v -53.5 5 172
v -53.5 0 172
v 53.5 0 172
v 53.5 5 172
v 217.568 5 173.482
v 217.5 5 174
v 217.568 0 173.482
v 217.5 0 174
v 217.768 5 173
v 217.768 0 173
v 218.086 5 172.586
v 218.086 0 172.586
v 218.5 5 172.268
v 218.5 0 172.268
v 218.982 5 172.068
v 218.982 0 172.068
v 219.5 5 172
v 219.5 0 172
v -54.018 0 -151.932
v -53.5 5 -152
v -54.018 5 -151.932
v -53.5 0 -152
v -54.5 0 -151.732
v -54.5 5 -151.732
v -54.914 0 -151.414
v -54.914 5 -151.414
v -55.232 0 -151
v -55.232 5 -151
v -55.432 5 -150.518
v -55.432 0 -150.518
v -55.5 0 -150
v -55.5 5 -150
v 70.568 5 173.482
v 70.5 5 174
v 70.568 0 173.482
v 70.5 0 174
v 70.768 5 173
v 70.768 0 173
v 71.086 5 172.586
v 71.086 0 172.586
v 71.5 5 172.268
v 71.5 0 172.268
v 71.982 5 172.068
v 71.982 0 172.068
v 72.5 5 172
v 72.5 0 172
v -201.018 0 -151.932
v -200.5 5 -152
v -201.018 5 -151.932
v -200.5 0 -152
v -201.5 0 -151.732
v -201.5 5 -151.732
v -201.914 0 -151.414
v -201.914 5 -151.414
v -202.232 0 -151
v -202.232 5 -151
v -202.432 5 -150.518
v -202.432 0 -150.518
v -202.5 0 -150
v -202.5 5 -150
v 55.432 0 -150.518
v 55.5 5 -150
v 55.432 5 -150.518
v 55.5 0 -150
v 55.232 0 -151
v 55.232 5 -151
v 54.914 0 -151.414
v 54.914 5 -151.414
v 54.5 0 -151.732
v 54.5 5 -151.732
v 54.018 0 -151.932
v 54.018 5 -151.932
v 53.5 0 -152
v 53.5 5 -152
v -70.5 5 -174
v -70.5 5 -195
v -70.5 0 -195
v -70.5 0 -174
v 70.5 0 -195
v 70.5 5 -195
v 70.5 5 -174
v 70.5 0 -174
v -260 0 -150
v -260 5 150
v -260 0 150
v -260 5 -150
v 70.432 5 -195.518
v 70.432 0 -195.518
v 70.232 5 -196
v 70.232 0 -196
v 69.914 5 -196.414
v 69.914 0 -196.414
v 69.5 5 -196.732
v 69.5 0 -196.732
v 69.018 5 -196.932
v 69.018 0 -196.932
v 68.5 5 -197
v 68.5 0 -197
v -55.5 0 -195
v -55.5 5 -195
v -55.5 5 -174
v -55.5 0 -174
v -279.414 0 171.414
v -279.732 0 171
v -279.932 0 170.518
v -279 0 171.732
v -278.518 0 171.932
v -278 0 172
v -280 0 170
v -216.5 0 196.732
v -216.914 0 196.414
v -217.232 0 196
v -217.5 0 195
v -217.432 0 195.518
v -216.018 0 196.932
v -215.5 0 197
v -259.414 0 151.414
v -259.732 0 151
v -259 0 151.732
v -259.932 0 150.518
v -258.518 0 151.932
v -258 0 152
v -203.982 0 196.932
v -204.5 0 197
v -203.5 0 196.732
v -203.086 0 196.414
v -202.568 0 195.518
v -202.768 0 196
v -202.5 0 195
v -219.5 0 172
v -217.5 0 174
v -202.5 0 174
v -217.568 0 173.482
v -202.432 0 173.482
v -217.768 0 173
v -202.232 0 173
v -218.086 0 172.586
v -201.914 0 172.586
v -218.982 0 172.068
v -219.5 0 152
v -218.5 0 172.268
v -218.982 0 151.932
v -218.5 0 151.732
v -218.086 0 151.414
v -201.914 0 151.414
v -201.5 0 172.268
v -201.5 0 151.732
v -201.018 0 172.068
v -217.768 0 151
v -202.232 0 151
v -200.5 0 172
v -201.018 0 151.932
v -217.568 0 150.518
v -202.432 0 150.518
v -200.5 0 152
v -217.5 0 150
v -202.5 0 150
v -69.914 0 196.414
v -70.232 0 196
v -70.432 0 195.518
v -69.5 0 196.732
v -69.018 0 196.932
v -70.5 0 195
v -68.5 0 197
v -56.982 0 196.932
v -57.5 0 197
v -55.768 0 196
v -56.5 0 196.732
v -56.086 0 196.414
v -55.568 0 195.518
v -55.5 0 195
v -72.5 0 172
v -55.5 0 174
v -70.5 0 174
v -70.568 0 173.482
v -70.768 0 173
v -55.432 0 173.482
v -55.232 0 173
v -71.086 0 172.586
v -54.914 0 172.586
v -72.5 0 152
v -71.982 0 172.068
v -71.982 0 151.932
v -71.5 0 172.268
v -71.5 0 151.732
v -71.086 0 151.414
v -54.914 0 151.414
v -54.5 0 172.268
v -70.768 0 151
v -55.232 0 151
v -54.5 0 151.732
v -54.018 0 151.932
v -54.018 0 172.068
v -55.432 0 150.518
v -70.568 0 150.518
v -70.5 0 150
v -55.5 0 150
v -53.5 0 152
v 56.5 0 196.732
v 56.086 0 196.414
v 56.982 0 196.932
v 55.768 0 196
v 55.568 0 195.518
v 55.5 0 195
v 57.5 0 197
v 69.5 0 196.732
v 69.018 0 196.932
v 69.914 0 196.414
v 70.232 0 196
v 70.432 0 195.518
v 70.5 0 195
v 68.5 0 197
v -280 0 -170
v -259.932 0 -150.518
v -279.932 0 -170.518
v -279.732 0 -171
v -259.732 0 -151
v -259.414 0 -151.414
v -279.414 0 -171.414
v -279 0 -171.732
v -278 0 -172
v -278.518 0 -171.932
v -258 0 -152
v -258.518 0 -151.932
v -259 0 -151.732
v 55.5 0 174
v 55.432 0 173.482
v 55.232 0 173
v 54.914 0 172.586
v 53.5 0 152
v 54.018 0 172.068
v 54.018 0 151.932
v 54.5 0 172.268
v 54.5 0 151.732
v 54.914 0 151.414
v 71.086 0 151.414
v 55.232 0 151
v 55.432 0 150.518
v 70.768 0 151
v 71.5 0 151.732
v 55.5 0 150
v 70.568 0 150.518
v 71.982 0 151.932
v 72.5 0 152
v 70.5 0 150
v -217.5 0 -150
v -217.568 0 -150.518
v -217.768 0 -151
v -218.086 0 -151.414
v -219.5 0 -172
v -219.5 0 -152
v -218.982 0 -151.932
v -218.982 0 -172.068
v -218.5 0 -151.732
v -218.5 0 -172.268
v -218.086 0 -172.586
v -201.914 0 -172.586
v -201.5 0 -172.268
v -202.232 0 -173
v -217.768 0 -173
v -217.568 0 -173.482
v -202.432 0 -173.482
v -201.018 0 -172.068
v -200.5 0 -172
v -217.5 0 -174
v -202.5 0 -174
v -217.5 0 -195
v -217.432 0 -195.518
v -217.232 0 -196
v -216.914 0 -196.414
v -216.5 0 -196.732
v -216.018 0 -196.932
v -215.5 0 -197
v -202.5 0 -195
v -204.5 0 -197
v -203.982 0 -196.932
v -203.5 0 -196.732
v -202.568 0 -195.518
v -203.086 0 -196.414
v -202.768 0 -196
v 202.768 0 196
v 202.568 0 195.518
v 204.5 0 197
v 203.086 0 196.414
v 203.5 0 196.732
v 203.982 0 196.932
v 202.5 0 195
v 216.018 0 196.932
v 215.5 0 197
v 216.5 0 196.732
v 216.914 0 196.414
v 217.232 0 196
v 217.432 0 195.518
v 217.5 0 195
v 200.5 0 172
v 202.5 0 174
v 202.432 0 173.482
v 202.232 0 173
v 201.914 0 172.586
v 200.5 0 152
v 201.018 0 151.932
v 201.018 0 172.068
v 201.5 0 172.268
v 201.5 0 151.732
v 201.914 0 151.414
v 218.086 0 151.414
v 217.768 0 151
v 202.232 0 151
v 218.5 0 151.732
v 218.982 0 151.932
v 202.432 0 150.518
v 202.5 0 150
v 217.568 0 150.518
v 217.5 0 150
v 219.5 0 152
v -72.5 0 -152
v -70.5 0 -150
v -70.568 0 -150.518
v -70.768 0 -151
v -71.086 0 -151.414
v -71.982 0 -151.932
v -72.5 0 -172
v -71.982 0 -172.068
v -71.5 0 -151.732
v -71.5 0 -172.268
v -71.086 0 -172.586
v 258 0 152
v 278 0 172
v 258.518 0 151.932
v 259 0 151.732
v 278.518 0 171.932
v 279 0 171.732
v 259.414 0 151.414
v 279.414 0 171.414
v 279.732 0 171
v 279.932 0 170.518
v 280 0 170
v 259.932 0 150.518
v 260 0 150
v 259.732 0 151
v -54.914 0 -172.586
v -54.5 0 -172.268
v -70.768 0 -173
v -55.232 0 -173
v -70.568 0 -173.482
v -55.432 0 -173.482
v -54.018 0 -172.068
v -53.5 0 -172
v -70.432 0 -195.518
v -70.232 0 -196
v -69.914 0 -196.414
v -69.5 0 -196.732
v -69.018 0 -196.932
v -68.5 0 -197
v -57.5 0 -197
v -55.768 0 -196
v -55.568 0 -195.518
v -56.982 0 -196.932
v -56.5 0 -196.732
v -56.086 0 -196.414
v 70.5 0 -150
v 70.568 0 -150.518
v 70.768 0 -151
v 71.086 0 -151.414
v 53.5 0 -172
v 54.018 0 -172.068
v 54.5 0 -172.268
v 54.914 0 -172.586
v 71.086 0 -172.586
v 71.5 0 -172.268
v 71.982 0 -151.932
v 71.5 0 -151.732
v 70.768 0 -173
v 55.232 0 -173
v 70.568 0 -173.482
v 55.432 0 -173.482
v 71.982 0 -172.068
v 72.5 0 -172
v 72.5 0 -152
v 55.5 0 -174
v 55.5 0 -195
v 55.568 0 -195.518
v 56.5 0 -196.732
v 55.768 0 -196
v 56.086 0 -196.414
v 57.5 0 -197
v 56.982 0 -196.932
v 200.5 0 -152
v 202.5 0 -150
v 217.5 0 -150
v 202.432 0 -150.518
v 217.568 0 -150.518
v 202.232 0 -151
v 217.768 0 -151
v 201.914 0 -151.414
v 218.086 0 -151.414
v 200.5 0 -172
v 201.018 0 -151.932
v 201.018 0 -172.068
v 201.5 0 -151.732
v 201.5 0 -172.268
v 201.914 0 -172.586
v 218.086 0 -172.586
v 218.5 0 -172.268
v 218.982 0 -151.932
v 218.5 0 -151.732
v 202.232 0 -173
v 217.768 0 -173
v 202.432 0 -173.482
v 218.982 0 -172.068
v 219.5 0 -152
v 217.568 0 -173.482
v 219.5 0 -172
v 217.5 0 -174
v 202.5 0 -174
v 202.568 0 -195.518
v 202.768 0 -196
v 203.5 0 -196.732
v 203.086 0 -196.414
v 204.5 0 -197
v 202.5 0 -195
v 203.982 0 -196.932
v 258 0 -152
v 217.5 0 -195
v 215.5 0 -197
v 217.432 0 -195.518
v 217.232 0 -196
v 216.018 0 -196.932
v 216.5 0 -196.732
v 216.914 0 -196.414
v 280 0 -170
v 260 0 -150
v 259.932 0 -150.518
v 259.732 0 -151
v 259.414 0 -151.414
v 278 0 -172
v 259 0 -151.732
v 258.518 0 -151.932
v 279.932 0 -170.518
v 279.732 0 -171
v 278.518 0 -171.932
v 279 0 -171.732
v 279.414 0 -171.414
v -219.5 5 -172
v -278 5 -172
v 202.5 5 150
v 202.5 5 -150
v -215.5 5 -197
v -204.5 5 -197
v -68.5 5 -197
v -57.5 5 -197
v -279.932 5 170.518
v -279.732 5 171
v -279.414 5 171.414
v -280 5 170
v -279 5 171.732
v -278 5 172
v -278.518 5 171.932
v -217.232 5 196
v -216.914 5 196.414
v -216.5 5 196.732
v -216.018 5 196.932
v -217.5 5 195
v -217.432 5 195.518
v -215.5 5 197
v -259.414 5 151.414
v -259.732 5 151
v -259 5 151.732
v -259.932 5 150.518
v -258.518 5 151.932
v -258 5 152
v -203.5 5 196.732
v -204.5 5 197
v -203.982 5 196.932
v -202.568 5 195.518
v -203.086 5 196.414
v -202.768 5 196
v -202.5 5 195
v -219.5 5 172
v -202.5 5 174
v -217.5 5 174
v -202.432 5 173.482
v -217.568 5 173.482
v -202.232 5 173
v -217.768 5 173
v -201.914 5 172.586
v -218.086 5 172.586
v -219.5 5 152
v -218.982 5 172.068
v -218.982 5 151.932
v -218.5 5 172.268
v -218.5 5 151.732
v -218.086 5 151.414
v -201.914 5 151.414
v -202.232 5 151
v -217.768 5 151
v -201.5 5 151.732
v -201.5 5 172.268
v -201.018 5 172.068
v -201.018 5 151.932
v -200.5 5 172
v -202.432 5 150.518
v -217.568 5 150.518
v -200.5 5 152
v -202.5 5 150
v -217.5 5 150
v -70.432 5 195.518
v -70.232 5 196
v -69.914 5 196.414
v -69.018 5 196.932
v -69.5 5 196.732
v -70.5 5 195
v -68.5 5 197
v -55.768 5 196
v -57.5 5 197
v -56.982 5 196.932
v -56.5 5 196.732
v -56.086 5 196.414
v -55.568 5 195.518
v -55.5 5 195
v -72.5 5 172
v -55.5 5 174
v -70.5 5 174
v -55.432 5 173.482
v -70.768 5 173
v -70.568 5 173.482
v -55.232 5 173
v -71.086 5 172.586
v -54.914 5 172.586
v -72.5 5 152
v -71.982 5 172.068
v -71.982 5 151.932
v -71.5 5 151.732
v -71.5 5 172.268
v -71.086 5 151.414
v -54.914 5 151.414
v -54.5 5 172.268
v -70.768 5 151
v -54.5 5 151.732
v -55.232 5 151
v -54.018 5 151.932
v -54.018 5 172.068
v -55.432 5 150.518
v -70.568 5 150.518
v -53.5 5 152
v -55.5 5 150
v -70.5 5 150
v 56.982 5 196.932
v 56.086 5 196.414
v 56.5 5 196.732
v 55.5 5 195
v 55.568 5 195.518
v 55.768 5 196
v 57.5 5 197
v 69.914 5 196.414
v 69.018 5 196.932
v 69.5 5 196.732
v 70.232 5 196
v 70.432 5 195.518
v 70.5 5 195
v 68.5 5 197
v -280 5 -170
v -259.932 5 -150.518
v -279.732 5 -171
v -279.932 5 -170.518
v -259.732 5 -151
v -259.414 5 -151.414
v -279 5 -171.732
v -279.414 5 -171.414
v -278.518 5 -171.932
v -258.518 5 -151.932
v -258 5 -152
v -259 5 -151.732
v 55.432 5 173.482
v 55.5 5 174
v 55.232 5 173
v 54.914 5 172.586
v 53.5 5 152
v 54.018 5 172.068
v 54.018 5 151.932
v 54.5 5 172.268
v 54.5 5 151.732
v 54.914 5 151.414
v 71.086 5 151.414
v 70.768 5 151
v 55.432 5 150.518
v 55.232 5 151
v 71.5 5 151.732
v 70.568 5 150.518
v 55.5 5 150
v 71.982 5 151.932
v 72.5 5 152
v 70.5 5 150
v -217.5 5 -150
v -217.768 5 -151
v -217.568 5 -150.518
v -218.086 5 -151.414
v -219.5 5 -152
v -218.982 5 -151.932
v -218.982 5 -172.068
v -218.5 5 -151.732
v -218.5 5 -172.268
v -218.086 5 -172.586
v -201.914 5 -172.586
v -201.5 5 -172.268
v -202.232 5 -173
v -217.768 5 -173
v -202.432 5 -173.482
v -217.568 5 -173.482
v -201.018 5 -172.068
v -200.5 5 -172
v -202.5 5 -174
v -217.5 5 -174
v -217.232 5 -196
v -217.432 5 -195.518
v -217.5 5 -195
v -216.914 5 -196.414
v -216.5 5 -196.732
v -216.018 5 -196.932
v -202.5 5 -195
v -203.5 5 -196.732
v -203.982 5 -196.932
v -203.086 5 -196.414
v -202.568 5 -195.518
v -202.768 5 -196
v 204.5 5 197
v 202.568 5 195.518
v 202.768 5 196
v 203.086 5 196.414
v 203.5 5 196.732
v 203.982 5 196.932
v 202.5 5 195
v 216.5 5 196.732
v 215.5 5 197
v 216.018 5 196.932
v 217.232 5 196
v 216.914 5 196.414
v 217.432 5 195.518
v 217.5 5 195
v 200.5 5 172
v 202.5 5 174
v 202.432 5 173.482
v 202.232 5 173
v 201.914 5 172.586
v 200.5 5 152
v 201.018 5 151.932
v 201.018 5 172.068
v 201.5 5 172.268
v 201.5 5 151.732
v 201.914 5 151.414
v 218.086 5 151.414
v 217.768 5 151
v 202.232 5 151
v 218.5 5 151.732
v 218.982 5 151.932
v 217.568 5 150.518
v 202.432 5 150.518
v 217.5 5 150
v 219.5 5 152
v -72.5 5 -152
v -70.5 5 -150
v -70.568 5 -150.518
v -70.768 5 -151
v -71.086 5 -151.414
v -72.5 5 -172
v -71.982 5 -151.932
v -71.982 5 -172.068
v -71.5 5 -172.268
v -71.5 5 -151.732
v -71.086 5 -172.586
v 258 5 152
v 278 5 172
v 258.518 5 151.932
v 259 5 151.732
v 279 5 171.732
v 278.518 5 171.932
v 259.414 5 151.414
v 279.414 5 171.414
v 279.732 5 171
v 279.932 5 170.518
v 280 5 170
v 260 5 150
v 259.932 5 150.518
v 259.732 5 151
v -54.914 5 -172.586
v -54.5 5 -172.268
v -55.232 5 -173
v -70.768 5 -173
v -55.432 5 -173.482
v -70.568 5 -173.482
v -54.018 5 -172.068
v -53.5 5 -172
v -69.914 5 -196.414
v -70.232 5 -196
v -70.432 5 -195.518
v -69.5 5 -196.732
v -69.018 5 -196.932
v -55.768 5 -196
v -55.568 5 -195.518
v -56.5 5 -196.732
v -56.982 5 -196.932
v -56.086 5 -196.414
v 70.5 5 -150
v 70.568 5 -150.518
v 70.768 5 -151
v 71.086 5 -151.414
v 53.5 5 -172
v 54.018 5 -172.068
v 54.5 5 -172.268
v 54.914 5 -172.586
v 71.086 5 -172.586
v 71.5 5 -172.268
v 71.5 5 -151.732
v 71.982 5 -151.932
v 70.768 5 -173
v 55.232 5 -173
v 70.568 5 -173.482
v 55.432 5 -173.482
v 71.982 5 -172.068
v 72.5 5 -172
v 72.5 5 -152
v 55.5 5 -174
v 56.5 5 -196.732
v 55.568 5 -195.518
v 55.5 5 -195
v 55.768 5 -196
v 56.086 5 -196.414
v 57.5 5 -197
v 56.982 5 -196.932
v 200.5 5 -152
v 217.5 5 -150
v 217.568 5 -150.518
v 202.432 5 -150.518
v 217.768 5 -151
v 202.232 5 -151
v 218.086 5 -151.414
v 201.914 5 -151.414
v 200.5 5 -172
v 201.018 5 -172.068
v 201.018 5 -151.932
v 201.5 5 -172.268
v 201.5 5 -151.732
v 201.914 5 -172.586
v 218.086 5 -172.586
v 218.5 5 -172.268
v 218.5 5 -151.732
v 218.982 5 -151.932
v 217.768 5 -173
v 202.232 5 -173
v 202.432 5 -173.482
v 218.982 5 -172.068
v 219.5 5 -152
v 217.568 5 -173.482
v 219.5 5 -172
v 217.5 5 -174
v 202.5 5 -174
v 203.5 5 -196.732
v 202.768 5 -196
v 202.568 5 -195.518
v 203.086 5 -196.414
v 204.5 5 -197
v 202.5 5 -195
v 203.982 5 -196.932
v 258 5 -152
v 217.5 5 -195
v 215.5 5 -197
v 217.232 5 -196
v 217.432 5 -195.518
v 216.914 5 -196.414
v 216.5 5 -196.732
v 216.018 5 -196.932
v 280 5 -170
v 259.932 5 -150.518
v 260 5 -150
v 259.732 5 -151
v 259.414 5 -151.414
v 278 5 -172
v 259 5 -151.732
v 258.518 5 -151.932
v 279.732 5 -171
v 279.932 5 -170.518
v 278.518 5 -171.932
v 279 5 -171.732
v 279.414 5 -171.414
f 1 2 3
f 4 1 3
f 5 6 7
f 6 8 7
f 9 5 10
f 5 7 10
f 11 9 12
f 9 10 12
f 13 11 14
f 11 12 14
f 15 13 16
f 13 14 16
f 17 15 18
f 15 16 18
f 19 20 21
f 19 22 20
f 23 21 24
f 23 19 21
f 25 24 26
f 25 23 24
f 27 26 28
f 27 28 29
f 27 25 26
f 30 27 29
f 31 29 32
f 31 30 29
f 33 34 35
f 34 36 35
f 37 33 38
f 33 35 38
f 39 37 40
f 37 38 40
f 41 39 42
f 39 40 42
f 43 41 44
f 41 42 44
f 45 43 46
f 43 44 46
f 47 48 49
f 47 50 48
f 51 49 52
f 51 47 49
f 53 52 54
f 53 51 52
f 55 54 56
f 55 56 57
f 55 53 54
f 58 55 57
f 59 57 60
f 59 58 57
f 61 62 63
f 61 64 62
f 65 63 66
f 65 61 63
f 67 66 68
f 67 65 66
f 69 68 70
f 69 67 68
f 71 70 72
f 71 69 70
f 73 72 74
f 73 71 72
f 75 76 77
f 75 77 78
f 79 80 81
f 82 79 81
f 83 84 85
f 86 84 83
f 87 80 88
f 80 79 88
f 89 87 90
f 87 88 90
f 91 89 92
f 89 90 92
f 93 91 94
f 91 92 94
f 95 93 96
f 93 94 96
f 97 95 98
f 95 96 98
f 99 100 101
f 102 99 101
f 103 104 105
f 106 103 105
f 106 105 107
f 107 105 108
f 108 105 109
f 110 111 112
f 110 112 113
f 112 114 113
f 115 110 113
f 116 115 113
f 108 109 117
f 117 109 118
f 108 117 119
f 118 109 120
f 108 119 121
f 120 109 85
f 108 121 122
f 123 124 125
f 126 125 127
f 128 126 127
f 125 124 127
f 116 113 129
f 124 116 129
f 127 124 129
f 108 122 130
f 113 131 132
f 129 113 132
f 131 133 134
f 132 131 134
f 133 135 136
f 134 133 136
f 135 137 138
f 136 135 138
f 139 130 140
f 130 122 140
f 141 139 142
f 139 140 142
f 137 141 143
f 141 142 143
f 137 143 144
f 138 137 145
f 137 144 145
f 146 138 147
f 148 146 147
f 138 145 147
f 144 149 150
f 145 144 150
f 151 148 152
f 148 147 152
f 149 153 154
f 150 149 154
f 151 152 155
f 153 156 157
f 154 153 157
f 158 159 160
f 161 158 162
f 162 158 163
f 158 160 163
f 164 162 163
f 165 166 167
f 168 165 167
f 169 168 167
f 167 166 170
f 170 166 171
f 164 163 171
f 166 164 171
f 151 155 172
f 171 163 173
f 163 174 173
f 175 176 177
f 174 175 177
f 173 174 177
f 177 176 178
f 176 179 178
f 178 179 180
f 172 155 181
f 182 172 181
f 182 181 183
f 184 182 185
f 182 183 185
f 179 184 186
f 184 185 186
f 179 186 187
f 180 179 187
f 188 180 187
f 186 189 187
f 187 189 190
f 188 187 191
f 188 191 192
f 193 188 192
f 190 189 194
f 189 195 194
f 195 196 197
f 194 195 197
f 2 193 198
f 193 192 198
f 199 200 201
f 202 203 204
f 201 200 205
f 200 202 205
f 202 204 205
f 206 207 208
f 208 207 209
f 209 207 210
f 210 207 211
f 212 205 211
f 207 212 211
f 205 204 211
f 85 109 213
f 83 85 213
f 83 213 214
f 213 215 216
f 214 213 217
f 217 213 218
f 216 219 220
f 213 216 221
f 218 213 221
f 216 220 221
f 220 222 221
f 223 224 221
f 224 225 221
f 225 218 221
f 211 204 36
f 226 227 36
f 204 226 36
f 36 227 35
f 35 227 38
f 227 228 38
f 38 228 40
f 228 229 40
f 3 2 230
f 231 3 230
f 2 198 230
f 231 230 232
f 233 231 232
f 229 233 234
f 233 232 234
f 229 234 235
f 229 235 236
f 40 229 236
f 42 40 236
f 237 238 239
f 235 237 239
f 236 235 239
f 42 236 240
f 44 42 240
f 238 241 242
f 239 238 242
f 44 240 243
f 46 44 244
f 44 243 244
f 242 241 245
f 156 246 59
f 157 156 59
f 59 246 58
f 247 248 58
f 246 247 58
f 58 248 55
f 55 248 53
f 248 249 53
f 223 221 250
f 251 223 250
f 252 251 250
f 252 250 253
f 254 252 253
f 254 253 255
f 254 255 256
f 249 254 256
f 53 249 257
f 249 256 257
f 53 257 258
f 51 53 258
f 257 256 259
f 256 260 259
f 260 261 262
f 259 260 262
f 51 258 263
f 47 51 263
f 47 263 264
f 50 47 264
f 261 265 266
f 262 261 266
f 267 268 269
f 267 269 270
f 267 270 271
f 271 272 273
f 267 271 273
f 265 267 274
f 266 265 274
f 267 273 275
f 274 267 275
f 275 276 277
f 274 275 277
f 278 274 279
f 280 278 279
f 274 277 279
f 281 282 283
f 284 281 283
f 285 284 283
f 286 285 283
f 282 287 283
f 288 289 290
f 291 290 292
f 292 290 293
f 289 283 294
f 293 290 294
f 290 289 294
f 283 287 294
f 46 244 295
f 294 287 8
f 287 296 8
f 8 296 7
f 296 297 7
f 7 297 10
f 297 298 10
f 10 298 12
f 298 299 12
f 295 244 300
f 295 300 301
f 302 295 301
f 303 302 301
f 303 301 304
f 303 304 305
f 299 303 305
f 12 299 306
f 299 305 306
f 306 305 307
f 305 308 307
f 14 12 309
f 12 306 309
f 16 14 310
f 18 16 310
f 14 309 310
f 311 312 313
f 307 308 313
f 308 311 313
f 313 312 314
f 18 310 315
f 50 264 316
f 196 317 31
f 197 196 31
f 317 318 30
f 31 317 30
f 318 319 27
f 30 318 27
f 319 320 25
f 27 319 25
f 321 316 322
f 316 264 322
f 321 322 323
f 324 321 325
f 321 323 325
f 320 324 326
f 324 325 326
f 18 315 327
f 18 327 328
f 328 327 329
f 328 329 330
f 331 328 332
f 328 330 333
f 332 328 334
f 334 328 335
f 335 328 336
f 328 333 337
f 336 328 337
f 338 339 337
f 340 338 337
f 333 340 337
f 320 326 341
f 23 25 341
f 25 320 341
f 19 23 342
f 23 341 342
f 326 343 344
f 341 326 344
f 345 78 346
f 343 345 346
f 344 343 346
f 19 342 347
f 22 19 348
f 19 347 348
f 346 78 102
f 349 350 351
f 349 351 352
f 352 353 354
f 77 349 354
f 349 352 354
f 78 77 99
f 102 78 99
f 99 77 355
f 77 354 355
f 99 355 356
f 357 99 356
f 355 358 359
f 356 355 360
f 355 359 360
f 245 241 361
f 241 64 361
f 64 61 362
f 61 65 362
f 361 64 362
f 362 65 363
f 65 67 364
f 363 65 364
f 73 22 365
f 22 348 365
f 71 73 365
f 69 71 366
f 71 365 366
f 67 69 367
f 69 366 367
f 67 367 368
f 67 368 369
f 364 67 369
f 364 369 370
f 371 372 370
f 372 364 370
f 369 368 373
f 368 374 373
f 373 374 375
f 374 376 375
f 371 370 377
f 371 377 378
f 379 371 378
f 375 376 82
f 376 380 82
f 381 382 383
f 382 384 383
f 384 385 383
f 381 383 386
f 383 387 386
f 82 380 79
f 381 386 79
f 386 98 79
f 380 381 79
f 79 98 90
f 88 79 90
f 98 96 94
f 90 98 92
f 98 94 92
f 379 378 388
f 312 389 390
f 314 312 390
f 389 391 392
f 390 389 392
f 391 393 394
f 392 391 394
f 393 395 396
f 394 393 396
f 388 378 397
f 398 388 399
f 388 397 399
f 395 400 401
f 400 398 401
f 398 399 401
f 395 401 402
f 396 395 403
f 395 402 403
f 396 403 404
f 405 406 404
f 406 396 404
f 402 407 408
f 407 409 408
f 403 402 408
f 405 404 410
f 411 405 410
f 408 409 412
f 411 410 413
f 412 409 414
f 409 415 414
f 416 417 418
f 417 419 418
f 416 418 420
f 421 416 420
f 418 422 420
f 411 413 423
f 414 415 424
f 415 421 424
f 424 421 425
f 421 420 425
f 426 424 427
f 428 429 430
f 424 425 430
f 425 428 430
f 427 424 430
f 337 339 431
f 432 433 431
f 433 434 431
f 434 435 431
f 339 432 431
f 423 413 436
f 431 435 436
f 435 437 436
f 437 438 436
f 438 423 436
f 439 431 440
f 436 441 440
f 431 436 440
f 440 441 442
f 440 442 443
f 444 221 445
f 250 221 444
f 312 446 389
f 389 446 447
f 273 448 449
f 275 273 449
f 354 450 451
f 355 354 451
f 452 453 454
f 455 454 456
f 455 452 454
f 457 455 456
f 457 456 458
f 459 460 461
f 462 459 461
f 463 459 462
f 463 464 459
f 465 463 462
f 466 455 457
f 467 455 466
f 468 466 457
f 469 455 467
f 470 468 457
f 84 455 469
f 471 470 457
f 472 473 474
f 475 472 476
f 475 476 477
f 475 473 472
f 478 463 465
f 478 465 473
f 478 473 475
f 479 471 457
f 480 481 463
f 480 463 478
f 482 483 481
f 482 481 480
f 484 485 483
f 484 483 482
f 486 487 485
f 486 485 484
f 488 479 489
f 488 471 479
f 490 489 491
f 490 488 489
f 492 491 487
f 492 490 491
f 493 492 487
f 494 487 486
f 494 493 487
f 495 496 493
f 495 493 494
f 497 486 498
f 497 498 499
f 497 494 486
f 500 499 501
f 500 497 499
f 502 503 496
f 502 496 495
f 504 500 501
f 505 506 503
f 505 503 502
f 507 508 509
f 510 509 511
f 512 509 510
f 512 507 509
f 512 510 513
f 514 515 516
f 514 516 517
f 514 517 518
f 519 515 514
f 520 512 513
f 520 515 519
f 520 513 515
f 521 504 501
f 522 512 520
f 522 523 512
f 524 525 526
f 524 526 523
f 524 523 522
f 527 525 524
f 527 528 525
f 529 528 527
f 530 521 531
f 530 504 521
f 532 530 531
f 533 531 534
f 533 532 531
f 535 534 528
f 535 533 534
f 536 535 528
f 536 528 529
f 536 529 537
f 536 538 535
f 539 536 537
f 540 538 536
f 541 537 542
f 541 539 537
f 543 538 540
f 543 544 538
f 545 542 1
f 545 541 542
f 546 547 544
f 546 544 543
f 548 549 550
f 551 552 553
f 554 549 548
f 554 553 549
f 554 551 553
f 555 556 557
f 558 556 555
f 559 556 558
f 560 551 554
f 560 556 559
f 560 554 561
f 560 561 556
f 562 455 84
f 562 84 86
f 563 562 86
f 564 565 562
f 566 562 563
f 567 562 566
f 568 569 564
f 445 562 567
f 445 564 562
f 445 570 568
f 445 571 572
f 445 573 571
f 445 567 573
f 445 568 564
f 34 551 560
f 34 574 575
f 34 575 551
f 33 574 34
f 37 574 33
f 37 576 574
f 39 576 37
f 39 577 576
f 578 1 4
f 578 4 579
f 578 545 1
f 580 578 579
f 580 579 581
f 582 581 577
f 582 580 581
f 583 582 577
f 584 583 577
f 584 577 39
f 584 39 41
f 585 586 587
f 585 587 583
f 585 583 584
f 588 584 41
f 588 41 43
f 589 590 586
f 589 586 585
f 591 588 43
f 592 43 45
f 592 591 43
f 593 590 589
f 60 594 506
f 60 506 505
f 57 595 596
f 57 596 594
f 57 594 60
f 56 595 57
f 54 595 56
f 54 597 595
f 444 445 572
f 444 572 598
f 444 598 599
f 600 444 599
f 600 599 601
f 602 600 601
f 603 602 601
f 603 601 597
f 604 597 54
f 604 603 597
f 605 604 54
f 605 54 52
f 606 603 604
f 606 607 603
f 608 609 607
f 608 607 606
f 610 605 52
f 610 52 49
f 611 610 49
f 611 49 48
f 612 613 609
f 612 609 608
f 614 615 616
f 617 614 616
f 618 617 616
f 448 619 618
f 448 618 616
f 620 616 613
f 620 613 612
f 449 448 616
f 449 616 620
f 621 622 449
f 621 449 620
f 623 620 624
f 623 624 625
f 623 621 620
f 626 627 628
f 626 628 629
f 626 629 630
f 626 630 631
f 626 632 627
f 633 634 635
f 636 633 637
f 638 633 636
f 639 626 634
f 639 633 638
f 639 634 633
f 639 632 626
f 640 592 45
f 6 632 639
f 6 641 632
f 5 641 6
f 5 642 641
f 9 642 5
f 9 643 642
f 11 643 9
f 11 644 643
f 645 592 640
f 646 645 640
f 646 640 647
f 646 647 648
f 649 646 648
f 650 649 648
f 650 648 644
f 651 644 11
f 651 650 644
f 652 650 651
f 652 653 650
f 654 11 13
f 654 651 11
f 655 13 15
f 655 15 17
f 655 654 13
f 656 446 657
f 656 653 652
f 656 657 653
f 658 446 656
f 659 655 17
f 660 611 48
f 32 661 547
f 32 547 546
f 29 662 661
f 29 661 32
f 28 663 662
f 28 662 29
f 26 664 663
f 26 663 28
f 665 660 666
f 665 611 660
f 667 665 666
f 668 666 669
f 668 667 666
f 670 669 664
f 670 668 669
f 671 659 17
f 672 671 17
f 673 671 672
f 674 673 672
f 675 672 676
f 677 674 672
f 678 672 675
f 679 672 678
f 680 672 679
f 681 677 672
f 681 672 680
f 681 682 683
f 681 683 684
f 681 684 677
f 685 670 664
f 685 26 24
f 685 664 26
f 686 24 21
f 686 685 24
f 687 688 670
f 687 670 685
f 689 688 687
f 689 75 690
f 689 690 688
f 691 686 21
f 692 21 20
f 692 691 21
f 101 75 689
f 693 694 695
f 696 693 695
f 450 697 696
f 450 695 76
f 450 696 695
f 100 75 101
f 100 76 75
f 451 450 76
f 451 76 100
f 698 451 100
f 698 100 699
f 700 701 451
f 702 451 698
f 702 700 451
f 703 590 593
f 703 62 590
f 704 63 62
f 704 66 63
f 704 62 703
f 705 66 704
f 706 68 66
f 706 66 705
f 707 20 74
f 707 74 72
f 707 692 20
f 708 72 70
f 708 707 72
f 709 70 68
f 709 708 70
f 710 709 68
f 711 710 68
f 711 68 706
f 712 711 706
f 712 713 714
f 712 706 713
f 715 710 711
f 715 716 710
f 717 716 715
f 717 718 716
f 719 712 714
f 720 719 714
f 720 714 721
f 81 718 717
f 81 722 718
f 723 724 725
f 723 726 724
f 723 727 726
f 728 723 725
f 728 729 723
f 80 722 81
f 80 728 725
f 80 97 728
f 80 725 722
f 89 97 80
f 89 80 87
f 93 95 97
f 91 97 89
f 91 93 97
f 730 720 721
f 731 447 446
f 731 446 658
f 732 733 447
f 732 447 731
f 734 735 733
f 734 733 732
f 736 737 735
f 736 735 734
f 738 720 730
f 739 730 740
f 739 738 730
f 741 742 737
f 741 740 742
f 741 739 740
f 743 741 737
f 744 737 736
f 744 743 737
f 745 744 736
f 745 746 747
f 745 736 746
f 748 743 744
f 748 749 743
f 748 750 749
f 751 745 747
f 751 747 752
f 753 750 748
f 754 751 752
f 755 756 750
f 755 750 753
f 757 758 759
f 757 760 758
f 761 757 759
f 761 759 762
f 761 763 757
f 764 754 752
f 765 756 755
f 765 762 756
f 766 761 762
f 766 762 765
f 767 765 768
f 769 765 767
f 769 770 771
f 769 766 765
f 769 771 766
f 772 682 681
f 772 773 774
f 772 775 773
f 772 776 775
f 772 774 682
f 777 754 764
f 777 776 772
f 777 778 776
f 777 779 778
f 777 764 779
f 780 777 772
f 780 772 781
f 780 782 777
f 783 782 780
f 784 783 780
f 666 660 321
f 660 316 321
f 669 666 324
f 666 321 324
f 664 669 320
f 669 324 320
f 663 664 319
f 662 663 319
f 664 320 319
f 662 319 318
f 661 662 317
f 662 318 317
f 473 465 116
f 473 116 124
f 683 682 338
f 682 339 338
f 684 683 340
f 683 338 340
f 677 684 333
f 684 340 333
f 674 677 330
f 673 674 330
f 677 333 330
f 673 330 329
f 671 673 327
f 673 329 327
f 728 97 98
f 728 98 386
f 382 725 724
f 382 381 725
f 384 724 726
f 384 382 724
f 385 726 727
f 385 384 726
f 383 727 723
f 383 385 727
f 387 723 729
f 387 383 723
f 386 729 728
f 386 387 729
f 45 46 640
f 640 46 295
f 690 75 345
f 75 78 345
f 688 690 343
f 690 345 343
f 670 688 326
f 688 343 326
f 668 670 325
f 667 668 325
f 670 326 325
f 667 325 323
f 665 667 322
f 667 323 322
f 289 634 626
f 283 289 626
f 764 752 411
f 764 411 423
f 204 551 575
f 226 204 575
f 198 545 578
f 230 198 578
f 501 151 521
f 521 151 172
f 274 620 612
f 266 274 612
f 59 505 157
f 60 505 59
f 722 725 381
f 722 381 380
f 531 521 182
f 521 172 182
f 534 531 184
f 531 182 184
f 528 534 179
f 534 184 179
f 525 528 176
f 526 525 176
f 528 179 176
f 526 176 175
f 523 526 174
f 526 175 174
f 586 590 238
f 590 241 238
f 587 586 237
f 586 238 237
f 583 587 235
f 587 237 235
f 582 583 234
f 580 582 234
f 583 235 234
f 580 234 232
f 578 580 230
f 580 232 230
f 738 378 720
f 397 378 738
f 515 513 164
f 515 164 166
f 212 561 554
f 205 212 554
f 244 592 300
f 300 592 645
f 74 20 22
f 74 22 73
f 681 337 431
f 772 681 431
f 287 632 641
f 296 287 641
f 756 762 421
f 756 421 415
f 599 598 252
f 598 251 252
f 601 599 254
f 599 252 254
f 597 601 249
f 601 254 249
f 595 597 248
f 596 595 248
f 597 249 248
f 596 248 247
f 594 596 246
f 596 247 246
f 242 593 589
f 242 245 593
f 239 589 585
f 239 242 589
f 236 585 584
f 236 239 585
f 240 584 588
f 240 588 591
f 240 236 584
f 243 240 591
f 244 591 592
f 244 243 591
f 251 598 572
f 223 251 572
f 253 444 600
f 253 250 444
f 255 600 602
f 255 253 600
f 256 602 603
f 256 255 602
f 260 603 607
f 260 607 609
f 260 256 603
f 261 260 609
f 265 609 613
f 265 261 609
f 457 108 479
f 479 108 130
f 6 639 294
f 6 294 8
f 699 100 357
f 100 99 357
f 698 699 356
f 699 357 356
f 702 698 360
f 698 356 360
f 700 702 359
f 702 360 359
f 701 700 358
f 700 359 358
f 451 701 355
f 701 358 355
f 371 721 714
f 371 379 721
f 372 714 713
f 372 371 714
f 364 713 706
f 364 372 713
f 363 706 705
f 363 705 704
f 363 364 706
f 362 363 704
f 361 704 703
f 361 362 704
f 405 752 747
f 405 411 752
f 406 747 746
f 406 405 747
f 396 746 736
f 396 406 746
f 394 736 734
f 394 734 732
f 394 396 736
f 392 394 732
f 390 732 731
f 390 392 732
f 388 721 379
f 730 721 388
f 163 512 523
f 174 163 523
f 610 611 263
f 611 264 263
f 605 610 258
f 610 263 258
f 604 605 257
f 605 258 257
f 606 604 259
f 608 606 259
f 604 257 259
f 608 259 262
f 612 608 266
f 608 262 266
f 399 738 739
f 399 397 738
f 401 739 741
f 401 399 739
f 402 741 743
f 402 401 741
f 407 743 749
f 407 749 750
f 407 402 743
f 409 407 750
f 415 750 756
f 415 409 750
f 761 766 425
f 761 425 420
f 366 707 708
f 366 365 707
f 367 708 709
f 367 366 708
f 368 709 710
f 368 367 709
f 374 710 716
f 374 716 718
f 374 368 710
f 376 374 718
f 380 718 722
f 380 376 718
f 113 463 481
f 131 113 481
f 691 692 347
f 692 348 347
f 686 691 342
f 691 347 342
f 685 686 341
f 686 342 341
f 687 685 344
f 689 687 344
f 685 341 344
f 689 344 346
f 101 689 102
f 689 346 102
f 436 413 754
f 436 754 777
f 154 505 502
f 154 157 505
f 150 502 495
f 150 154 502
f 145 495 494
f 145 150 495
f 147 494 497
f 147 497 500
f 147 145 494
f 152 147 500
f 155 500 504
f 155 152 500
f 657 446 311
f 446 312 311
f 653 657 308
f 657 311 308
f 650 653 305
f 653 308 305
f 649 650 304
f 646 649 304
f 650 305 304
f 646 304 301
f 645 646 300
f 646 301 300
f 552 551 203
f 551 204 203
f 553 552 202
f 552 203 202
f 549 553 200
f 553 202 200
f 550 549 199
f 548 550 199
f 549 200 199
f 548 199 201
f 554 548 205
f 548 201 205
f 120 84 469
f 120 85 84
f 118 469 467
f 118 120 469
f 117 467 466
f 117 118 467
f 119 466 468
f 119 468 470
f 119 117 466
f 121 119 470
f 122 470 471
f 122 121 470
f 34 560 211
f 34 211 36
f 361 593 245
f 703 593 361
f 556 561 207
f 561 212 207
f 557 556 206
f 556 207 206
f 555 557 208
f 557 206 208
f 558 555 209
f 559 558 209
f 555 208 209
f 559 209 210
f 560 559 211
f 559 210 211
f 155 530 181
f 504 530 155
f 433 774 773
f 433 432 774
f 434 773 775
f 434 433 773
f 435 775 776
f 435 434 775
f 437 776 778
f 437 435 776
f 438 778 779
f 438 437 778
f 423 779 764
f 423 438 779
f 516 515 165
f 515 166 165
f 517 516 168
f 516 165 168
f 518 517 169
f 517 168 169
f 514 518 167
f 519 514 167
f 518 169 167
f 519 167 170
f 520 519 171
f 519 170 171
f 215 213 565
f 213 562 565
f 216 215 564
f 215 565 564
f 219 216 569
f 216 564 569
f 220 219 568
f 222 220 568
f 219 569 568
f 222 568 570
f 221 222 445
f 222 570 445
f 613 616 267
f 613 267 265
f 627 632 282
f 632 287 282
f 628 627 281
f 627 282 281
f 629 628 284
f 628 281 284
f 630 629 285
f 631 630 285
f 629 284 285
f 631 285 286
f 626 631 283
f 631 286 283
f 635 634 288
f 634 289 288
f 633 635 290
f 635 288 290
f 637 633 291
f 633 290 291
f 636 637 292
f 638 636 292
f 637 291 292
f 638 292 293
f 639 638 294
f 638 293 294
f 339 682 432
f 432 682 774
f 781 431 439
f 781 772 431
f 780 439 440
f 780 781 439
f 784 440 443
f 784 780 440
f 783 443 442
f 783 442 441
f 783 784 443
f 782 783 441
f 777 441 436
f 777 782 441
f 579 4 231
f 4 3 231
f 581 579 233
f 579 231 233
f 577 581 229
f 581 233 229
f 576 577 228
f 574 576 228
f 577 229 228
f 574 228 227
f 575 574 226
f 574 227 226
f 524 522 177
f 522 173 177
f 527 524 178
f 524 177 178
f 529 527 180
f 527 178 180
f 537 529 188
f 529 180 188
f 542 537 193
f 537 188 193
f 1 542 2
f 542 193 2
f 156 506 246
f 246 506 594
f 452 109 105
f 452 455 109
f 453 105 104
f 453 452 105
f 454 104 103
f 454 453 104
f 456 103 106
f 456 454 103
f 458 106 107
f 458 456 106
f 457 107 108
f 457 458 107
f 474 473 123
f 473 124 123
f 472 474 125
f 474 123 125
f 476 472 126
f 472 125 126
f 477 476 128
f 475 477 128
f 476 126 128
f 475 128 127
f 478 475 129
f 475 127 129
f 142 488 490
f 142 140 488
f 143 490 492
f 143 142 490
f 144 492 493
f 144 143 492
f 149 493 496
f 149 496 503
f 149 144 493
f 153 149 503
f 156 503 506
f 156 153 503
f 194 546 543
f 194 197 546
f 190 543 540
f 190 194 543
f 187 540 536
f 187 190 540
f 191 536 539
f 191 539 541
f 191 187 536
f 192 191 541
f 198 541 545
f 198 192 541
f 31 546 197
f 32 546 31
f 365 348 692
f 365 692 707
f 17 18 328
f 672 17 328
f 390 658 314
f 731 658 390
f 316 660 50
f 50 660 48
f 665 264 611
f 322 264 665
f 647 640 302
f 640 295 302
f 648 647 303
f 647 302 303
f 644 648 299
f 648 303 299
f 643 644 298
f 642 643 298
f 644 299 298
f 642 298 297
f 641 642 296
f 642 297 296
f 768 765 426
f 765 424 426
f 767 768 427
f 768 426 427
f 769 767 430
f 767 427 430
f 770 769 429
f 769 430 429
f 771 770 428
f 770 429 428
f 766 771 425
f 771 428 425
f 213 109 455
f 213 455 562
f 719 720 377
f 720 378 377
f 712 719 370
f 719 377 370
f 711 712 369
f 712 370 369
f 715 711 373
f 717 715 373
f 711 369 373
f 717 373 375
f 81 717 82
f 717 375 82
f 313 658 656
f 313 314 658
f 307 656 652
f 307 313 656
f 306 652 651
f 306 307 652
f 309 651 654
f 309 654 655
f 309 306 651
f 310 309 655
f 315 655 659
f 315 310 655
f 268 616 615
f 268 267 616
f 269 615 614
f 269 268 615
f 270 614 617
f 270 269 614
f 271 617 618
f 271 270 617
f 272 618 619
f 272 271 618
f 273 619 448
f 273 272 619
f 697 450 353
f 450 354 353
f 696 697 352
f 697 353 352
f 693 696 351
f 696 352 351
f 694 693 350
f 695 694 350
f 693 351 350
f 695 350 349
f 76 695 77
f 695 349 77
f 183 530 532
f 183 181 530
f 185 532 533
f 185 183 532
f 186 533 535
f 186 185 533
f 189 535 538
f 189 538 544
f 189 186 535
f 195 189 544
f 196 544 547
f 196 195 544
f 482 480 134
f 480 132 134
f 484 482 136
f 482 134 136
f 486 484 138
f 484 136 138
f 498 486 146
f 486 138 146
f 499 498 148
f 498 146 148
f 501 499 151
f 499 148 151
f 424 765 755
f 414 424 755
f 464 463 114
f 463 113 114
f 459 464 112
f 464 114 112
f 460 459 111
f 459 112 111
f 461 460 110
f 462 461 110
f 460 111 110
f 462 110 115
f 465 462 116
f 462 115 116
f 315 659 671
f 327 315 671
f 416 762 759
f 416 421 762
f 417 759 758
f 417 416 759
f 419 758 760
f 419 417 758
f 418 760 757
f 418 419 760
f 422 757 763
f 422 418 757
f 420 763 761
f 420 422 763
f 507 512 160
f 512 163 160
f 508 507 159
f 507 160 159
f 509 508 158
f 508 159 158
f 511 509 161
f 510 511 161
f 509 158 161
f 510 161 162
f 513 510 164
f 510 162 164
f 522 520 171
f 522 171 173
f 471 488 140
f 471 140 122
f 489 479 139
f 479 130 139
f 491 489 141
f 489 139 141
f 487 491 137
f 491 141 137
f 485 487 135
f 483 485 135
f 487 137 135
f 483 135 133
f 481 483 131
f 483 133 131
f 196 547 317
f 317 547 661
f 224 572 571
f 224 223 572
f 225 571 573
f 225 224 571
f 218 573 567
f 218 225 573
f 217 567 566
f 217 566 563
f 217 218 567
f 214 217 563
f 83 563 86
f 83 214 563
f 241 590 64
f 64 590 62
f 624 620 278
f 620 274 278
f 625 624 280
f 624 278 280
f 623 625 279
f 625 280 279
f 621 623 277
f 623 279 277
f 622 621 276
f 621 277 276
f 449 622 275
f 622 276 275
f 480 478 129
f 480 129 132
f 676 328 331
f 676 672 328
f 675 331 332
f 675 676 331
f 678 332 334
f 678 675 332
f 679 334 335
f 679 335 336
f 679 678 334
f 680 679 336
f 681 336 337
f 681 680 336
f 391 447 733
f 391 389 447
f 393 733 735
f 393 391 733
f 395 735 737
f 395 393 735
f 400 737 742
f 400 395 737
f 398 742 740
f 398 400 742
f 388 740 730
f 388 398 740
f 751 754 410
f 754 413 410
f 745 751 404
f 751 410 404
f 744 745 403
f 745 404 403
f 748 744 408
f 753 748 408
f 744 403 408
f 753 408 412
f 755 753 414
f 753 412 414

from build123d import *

# Parameters (mm, degrees)
SKETCH1_W               = 560
SKETCH1_H               = 344
BOSS_EXTRUDE1_DEPTH     = 5
SKETCH2_W               = 15
SKETCH2_H               = 25
BOSS_EXTRUDE2_DEPTH     = 5
MIRROR5_COPY_1_SKETCH_W = 15
MIRROR5_COPY_1_SKETCH_H = 25
MIRROR5_COPY_1_DEPTH    = 5
FILLET3_R               = 2
SKETCH3_W               = 42.5
SKETCH3_H               = 304
SKETCH3_W_2             = 132
SKETCH3_W_3             = 55.5
CUT_EXTRUDE1_DEPTH      = 343.394509302
FILLET4_R               = 2


with BuildPart() as part:
    # Sketch1 → Boss-Extrude1 (new body)
    with BuildSketch(Plane(origin=(0, 0, 0), x_dir=(1, 0, 0), z_dir=(0, 1, 0))):
        Rectangle(SKETCH1_W, SKETCH1_H)
    extrude(amount=BOSS_EXTRUDE1_DEPTH)

    # Sketch2 → Boss-Extrude2 (add)
    with BuildSketch(Plane(origin=(0, 5, 0), x_dir=(1, 0, 0), z_dir=(0, 1, 0))):
        with Locations((-63, -184.5)):
            Rectangle(SKETCH2_W, SKETCH2_H)
        with Locations((-210, -184.5)):
            Rectangle(SKETCH2_W, SKETCH2_H)
    boss_extrude2 = extrude(amount=-BOSS_EXTRUDE2_DEPTH)

    # Mirror4: Boss-Extrude2 across plane
    add(boss_extrude2.mirror(Plane(origin=(0, 0, 0), x_dir=(0, 0, 1), z_dir=(1, 0, 0))))

    # Mirror5: Boss-Extrude2 across plane
    add(boss_extrude2.mirror(Plane.XY))

    # Mirror5 copy 1 sketch → Mirror5 copy 1 (add)
    with BuildSketch(Plane(origin=(0, 5, 0), x_dir=(-1, 0, 0), z_dir=(0, 1, 0))):
        with Locations((-63, -184.5)):
            Rectangle(MIRROR5_COPY_1_SKETCH_W, MIRROR5_COPY_1_SKETCH_H)
        with Locations((-210, -184.5)):
            Rectangle(MIRROR5_COPY_1_SKETCH_W, MIRROR5_COPY_1_SKETCH_H)
    extrude(amount=-MIRROR5_COPY_1_DEPTH)

    # Fillet3
    fillet3_edges = [part.edges().sort_by_distance(p)[0] for p in [
        (-70.5, 2.5, 197),
        (-70.5, 2.5, 172),
        (-55.5, 2.5, 172),
        (-55.5, 2.5, 197),
        (-202.5, 2.5, 172),
        (-202.5, 2.5, 197),
        (-217.5, 2.5, 197),
        (-217.5, 2.5, 172),
        (55.5, 2.5, 172),
        (55.5, 2.5, 197),
        (70.5, 2.5, 197),
        (70.5, 2.5, 172),
        (217.5, 2.5, 197),
        (217.5, 2.5, 172),
        (202.5, 2.5, 172),
        (202.5, 2.5, 197),
        (70.5, 2.5, -197),
        (70.5, 2.5, -172),
        (55.5, 2.5, -172),
        (55.5, 2.5, -197),
        (202.5, 2.5, -172),
        (202.5, 2.5, -197),
        (217.5, 2.5, -197),
        (217.5, 2.5, -172),
        (-280, 2.5, -172),
        (280, 2.5, -172),
        (280, 2.5, 172),
        (-280, 2.5, 172),
        (-55.5, 2.5, -172),
        (-55.5, 2.5, -197),
        (-70.5, 2.5, -197),
        (-70.5, 2.5, -172),
        (-217.5, 2.5, -197),
        (-217.5, 2.5, -172),
        (-202.5, 2.5, -172),
        (-202.5, 2.5, -197),
    ]]
    fillet(fillet3_edges, radius=FILLET3_R)

    # Sketch3 → Cut-Extrude1 (cut, through all)
    with BuildSketch(Plane(origin=(0, 5, 0), x_dir=(1, 0, 0), z_dir=(0, 1, 0))):
        with Locations((238.75, 0)):
            Rectangle(SKETCH3_W, SKETCH3_H)
        with Locations((136.5, 0)):
            Rectangle(SKETCH3_W_2, SKETCH3_H)
        with Locations((27.75, 0)):
            Rectangle(SKETCH3_W_3, SKETCH3_H)
    cut_extrude1 = extrude(amount=-CUT_EXTRUDE1_DEPTH, mode=Mode.SUBTRACT)

    # Mirror6: Cut-Extrude1 across plane
    add(cut_extrude1.mirror(Plane(origin=(0, 0, 0), x_dir=(0, 0, 1), z_dir=(1, 0, 0))), mode=Mode.SUBTRACT)

    # Fillet4
    fillet4_edges = [part.edges().sort_by_distance(p)[0] for p in [
        (217.5, 2.5, 152),
        (217.5, 2.5, -152),
        (260, 2.5, -152),
        (260, 2.5, 152),
        (202.5, 2.5, -152),
        (202.5, 2.5, 152),
        (70.5, 2.5, 152),
        (70.5, 2.5, -152),
        (55.5, 2.5, -152),
        (55.5, 2.5, 152),
        (-217.5, 2.5, -152),
        (-217.5, 2.5, 152),
        (-260, 2.5, 152),
        (-260, 2.5, -152),
        (-202.5, 2.5, 152),
        (-202.5, 2.5, -152),
        (-70.5, 2.5, -152),
        (-70.5, 2.5, 152),
        (-55.5, 2.5, 152),
        (-55.5, 2.5, -152),
    ]]
    fillet(fillet4_edges, radius=FILLET4_R)


solid = part.part
